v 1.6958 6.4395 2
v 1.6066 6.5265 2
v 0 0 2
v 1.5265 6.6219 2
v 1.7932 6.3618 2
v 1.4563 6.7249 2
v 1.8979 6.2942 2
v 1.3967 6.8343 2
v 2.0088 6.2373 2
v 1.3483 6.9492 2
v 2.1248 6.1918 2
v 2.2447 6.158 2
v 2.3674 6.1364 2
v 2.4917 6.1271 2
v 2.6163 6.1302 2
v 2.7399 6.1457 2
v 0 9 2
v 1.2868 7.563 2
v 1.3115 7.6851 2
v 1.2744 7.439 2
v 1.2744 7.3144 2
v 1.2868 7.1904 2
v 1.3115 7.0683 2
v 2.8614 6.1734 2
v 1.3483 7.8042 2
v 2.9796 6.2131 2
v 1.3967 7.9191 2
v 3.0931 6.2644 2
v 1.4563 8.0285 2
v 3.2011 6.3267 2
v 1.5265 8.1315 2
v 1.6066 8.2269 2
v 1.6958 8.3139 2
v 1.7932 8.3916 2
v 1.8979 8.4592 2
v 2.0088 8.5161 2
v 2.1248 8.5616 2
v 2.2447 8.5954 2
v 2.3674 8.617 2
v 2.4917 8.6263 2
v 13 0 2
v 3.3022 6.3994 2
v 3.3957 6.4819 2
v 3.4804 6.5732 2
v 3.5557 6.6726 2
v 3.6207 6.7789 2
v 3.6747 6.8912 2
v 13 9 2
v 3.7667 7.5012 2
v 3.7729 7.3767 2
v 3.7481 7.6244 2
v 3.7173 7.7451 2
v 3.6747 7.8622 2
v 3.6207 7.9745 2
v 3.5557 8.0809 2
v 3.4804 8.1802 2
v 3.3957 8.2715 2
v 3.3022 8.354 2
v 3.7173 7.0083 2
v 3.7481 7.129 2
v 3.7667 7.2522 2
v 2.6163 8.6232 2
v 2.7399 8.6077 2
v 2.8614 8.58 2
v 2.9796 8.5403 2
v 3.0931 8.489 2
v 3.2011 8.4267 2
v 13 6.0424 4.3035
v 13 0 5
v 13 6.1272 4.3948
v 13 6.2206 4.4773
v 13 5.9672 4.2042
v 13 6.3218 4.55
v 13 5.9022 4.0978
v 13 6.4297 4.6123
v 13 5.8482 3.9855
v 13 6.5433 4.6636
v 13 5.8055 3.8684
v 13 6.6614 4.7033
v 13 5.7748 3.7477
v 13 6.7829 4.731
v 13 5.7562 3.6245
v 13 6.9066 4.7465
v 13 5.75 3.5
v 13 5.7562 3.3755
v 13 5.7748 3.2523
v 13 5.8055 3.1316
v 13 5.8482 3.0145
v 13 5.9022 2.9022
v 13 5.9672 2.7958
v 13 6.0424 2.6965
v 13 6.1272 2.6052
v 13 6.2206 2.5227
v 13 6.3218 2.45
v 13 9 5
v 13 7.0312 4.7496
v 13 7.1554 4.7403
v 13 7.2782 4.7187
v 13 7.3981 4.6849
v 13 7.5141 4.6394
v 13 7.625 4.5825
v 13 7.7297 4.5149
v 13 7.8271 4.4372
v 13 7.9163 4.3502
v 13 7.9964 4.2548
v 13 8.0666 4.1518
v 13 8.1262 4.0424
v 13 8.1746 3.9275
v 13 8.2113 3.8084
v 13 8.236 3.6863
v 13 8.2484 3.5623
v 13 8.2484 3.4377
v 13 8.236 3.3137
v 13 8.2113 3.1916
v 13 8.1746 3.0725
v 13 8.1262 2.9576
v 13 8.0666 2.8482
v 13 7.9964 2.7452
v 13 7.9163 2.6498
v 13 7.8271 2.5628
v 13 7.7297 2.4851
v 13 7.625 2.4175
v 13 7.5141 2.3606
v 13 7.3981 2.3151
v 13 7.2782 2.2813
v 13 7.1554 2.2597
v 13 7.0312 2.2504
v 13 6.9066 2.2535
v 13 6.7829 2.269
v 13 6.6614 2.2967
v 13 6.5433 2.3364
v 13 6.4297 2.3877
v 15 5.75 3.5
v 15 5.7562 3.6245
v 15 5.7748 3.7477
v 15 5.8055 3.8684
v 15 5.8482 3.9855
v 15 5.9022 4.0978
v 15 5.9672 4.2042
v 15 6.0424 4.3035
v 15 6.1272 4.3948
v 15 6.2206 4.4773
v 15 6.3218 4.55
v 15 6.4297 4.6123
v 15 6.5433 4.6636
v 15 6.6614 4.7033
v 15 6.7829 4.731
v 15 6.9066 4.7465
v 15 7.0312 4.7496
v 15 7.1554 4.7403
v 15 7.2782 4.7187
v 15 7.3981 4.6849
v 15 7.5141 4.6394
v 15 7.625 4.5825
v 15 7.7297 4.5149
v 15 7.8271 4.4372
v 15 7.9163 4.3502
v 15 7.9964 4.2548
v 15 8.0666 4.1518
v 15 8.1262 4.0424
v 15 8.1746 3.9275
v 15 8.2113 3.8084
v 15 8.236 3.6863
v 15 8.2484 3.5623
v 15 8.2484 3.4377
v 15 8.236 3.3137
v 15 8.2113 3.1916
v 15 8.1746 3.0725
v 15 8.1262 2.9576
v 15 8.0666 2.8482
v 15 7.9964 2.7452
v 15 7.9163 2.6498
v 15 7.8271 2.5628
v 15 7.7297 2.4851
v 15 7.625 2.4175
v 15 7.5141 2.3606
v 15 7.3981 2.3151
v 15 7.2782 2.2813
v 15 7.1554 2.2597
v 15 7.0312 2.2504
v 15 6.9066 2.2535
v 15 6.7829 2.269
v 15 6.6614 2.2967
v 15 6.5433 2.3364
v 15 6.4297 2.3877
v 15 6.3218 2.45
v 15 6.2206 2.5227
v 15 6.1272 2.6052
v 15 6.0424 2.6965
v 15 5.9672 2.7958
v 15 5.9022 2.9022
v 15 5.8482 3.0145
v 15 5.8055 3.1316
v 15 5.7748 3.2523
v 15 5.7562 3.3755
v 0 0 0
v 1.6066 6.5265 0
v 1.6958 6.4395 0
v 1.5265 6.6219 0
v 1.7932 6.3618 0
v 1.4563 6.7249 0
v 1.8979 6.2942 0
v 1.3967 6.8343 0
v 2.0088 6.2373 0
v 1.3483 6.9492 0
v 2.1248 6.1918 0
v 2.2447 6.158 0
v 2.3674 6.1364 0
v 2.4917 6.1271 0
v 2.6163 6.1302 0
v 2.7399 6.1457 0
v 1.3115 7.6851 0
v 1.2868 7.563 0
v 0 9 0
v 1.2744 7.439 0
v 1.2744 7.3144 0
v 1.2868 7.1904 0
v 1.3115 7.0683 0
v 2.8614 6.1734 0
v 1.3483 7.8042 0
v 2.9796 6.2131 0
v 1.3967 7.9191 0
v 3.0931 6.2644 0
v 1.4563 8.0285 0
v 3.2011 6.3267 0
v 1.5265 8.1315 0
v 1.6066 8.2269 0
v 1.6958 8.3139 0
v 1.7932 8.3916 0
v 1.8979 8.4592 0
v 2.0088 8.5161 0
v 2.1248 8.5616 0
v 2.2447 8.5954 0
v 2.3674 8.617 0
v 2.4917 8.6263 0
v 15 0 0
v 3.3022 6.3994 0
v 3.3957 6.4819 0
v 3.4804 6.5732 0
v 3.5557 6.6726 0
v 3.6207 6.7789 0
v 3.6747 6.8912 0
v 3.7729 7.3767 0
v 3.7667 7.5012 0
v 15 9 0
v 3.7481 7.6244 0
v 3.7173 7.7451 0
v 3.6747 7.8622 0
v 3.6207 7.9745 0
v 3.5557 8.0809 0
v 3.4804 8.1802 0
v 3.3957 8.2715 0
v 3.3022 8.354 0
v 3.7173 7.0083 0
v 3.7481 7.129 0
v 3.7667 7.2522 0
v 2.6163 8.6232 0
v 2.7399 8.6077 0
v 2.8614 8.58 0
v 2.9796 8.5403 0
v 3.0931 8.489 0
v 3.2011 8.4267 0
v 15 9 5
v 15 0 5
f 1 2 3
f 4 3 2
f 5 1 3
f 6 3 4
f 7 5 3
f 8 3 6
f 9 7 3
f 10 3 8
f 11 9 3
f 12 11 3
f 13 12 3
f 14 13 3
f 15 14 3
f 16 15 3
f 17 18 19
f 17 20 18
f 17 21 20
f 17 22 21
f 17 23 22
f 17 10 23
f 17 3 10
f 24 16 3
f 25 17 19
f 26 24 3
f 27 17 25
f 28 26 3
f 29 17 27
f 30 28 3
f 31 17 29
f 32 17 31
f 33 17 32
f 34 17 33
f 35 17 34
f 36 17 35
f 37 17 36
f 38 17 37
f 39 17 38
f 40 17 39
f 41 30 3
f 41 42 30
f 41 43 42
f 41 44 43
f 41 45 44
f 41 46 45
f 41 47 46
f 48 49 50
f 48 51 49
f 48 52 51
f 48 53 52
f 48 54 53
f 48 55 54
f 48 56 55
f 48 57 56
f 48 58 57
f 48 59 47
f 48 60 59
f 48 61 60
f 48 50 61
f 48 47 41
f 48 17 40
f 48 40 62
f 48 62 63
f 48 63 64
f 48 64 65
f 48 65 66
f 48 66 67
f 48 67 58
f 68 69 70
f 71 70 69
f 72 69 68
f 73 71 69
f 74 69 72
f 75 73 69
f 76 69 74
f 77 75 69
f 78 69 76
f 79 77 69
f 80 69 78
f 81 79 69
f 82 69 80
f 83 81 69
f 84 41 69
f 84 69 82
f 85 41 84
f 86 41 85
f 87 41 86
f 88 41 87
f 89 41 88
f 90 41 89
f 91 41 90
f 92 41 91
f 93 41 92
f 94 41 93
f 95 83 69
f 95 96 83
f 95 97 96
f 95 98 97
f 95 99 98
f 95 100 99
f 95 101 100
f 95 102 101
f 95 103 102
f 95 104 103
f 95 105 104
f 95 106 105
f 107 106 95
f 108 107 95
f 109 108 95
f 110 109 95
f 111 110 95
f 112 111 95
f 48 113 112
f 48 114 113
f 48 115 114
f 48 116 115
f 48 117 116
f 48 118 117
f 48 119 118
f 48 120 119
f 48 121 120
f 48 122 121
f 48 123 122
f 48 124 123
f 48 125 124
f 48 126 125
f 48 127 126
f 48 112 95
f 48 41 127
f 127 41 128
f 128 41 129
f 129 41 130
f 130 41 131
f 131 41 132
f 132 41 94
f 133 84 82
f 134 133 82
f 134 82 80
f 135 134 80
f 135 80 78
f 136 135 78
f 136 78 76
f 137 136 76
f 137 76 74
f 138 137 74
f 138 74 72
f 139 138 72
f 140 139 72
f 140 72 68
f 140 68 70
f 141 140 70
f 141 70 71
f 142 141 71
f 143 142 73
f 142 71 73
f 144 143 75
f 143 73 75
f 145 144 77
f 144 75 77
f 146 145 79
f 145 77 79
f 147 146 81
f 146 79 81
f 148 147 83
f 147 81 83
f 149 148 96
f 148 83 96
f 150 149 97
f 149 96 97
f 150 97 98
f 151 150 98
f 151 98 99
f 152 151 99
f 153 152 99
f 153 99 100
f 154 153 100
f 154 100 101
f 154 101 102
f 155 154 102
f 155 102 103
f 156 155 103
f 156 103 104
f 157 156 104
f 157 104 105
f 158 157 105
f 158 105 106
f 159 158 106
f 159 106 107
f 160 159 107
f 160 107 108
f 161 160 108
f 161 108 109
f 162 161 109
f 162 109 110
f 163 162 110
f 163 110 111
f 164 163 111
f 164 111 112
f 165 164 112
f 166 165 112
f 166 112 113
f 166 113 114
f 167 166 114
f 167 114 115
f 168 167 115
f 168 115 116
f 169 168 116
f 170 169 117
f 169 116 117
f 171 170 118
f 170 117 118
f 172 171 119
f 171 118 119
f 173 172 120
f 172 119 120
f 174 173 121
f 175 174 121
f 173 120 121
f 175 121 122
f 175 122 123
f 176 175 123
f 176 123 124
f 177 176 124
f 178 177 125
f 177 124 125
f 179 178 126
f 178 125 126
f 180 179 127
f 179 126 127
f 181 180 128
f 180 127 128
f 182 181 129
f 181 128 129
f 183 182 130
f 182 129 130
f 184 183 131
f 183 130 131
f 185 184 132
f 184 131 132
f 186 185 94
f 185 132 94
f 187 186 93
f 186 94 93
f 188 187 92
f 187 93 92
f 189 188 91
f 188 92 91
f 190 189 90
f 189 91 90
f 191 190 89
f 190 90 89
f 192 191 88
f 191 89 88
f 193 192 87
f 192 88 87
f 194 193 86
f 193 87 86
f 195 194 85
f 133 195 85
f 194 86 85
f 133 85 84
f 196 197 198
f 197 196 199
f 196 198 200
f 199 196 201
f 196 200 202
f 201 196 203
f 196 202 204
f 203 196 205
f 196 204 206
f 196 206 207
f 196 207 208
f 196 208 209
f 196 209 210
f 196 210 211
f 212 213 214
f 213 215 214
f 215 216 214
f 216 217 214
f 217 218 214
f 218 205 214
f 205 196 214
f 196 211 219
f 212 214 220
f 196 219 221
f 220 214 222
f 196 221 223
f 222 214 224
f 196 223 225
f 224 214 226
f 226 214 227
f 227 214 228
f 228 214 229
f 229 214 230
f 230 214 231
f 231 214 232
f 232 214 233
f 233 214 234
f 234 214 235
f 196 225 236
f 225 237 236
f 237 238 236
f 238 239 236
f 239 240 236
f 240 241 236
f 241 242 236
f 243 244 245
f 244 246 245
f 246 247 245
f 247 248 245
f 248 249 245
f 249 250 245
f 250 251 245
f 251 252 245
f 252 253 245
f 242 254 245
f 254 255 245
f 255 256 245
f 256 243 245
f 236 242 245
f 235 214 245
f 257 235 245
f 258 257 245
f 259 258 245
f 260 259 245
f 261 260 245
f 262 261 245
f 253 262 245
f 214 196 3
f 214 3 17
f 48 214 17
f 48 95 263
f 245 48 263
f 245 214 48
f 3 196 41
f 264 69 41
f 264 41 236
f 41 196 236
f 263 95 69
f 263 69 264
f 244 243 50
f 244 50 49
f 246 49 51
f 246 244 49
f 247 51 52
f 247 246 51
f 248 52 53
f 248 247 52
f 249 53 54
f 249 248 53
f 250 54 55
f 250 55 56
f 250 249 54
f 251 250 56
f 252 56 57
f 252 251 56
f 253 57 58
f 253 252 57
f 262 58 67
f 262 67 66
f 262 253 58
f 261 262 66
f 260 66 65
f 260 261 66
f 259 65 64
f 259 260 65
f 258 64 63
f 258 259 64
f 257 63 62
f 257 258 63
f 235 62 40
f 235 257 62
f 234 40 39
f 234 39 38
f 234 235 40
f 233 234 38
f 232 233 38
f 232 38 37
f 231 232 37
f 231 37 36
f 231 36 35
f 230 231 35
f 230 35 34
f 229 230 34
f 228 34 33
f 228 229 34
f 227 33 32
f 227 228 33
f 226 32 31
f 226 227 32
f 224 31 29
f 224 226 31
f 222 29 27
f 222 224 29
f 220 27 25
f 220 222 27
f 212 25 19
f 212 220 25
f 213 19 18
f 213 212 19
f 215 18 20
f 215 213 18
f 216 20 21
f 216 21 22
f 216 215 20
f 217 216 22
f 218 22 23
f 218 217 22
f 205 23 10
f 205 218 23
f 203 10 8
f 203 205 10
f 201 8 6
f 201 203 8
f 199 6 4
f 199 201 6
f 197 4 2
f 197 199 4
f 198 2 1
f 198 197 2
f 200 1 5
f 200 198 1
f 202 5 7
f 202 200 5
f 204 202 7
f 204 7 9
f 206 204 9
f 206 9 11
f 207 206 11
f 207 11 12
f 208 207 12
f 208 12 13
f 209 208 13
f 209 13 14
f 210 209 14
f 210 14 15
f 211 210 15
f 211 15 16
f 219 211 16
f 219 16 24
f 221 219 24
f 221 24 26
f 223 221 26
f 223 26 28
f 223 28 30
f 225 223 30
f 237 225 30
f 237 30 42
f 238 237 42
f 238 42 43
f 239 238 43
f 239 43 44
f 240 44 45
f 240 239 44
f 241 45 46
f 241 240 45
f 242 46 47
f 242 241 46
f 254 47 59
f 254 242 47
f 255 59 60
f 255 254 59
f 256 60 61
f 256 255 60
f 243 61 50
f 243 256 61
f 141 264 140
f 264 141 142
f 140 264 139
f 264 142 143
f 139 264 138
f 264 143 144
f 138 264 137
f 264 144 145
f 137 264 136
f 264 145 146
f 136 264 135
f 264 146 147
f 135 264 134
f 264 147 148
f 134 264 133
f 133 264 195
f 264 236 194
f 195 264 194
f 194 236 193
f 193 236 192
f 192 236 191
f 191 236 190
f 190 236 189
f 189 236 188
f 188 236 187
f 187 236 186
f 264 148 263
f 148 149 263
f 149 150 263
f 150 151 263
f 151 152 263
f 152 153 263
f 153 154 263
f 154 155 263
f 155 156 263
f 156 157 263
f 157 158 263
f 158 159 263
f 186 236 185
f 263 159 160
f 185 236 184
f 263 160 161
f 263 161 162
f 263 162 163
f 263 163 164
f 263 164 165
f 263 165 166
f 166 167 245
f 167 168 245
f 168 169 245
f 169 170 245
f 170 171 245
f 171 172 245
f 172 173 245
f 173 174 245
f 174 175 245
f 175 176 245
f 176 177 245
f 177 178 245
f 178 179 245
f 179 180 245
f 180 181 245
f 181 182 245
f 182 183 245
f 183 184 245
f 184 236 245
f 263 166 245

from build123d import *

# Parameters (mm, degrees)
F0_W     = 15
F0_H     = 9
F0_R     = 1.25
F2_DEPTH = 2
F1_W     = 2
F1_H     = 9
F3_DEPTH = 5
F4_R     = 1.25
F5_DEPTH = 25


with BuildPart() as f2:
    # F0 (on Top) → F2 (new body)
    with BuildSketch(Plane.XY):
        with Locations((7.5, 4.5)):
            Rectangle(F0_W, F0_H)
        with Locations((2.522875, 7.376701)):
            Circle(F0_R, mode=Mode.SUBTRACT)
    extrude(amount=F2_DEPTH)

    # F1 (on Top) → F3 (join)
    with BuildSketch(Plane.XY):
        with Locations((14, 4.5)):
            Rectangle(F1_W, F1_H)
    extrude(amount=F3_DEPTH)

    # F4 (on face) → F5 (cut)
    with BuildSketch(Plane(origin=(13, 0, 0), x_dir=(0, -1, 0), z_dir=(-1, 0, 0))):
        with Locations((-7, 3.5)):
            Circle(F4_R)
    extrude(amount=-F5_DEPTH, mode=Mode.SUBTRACT)


solid = f2.part
